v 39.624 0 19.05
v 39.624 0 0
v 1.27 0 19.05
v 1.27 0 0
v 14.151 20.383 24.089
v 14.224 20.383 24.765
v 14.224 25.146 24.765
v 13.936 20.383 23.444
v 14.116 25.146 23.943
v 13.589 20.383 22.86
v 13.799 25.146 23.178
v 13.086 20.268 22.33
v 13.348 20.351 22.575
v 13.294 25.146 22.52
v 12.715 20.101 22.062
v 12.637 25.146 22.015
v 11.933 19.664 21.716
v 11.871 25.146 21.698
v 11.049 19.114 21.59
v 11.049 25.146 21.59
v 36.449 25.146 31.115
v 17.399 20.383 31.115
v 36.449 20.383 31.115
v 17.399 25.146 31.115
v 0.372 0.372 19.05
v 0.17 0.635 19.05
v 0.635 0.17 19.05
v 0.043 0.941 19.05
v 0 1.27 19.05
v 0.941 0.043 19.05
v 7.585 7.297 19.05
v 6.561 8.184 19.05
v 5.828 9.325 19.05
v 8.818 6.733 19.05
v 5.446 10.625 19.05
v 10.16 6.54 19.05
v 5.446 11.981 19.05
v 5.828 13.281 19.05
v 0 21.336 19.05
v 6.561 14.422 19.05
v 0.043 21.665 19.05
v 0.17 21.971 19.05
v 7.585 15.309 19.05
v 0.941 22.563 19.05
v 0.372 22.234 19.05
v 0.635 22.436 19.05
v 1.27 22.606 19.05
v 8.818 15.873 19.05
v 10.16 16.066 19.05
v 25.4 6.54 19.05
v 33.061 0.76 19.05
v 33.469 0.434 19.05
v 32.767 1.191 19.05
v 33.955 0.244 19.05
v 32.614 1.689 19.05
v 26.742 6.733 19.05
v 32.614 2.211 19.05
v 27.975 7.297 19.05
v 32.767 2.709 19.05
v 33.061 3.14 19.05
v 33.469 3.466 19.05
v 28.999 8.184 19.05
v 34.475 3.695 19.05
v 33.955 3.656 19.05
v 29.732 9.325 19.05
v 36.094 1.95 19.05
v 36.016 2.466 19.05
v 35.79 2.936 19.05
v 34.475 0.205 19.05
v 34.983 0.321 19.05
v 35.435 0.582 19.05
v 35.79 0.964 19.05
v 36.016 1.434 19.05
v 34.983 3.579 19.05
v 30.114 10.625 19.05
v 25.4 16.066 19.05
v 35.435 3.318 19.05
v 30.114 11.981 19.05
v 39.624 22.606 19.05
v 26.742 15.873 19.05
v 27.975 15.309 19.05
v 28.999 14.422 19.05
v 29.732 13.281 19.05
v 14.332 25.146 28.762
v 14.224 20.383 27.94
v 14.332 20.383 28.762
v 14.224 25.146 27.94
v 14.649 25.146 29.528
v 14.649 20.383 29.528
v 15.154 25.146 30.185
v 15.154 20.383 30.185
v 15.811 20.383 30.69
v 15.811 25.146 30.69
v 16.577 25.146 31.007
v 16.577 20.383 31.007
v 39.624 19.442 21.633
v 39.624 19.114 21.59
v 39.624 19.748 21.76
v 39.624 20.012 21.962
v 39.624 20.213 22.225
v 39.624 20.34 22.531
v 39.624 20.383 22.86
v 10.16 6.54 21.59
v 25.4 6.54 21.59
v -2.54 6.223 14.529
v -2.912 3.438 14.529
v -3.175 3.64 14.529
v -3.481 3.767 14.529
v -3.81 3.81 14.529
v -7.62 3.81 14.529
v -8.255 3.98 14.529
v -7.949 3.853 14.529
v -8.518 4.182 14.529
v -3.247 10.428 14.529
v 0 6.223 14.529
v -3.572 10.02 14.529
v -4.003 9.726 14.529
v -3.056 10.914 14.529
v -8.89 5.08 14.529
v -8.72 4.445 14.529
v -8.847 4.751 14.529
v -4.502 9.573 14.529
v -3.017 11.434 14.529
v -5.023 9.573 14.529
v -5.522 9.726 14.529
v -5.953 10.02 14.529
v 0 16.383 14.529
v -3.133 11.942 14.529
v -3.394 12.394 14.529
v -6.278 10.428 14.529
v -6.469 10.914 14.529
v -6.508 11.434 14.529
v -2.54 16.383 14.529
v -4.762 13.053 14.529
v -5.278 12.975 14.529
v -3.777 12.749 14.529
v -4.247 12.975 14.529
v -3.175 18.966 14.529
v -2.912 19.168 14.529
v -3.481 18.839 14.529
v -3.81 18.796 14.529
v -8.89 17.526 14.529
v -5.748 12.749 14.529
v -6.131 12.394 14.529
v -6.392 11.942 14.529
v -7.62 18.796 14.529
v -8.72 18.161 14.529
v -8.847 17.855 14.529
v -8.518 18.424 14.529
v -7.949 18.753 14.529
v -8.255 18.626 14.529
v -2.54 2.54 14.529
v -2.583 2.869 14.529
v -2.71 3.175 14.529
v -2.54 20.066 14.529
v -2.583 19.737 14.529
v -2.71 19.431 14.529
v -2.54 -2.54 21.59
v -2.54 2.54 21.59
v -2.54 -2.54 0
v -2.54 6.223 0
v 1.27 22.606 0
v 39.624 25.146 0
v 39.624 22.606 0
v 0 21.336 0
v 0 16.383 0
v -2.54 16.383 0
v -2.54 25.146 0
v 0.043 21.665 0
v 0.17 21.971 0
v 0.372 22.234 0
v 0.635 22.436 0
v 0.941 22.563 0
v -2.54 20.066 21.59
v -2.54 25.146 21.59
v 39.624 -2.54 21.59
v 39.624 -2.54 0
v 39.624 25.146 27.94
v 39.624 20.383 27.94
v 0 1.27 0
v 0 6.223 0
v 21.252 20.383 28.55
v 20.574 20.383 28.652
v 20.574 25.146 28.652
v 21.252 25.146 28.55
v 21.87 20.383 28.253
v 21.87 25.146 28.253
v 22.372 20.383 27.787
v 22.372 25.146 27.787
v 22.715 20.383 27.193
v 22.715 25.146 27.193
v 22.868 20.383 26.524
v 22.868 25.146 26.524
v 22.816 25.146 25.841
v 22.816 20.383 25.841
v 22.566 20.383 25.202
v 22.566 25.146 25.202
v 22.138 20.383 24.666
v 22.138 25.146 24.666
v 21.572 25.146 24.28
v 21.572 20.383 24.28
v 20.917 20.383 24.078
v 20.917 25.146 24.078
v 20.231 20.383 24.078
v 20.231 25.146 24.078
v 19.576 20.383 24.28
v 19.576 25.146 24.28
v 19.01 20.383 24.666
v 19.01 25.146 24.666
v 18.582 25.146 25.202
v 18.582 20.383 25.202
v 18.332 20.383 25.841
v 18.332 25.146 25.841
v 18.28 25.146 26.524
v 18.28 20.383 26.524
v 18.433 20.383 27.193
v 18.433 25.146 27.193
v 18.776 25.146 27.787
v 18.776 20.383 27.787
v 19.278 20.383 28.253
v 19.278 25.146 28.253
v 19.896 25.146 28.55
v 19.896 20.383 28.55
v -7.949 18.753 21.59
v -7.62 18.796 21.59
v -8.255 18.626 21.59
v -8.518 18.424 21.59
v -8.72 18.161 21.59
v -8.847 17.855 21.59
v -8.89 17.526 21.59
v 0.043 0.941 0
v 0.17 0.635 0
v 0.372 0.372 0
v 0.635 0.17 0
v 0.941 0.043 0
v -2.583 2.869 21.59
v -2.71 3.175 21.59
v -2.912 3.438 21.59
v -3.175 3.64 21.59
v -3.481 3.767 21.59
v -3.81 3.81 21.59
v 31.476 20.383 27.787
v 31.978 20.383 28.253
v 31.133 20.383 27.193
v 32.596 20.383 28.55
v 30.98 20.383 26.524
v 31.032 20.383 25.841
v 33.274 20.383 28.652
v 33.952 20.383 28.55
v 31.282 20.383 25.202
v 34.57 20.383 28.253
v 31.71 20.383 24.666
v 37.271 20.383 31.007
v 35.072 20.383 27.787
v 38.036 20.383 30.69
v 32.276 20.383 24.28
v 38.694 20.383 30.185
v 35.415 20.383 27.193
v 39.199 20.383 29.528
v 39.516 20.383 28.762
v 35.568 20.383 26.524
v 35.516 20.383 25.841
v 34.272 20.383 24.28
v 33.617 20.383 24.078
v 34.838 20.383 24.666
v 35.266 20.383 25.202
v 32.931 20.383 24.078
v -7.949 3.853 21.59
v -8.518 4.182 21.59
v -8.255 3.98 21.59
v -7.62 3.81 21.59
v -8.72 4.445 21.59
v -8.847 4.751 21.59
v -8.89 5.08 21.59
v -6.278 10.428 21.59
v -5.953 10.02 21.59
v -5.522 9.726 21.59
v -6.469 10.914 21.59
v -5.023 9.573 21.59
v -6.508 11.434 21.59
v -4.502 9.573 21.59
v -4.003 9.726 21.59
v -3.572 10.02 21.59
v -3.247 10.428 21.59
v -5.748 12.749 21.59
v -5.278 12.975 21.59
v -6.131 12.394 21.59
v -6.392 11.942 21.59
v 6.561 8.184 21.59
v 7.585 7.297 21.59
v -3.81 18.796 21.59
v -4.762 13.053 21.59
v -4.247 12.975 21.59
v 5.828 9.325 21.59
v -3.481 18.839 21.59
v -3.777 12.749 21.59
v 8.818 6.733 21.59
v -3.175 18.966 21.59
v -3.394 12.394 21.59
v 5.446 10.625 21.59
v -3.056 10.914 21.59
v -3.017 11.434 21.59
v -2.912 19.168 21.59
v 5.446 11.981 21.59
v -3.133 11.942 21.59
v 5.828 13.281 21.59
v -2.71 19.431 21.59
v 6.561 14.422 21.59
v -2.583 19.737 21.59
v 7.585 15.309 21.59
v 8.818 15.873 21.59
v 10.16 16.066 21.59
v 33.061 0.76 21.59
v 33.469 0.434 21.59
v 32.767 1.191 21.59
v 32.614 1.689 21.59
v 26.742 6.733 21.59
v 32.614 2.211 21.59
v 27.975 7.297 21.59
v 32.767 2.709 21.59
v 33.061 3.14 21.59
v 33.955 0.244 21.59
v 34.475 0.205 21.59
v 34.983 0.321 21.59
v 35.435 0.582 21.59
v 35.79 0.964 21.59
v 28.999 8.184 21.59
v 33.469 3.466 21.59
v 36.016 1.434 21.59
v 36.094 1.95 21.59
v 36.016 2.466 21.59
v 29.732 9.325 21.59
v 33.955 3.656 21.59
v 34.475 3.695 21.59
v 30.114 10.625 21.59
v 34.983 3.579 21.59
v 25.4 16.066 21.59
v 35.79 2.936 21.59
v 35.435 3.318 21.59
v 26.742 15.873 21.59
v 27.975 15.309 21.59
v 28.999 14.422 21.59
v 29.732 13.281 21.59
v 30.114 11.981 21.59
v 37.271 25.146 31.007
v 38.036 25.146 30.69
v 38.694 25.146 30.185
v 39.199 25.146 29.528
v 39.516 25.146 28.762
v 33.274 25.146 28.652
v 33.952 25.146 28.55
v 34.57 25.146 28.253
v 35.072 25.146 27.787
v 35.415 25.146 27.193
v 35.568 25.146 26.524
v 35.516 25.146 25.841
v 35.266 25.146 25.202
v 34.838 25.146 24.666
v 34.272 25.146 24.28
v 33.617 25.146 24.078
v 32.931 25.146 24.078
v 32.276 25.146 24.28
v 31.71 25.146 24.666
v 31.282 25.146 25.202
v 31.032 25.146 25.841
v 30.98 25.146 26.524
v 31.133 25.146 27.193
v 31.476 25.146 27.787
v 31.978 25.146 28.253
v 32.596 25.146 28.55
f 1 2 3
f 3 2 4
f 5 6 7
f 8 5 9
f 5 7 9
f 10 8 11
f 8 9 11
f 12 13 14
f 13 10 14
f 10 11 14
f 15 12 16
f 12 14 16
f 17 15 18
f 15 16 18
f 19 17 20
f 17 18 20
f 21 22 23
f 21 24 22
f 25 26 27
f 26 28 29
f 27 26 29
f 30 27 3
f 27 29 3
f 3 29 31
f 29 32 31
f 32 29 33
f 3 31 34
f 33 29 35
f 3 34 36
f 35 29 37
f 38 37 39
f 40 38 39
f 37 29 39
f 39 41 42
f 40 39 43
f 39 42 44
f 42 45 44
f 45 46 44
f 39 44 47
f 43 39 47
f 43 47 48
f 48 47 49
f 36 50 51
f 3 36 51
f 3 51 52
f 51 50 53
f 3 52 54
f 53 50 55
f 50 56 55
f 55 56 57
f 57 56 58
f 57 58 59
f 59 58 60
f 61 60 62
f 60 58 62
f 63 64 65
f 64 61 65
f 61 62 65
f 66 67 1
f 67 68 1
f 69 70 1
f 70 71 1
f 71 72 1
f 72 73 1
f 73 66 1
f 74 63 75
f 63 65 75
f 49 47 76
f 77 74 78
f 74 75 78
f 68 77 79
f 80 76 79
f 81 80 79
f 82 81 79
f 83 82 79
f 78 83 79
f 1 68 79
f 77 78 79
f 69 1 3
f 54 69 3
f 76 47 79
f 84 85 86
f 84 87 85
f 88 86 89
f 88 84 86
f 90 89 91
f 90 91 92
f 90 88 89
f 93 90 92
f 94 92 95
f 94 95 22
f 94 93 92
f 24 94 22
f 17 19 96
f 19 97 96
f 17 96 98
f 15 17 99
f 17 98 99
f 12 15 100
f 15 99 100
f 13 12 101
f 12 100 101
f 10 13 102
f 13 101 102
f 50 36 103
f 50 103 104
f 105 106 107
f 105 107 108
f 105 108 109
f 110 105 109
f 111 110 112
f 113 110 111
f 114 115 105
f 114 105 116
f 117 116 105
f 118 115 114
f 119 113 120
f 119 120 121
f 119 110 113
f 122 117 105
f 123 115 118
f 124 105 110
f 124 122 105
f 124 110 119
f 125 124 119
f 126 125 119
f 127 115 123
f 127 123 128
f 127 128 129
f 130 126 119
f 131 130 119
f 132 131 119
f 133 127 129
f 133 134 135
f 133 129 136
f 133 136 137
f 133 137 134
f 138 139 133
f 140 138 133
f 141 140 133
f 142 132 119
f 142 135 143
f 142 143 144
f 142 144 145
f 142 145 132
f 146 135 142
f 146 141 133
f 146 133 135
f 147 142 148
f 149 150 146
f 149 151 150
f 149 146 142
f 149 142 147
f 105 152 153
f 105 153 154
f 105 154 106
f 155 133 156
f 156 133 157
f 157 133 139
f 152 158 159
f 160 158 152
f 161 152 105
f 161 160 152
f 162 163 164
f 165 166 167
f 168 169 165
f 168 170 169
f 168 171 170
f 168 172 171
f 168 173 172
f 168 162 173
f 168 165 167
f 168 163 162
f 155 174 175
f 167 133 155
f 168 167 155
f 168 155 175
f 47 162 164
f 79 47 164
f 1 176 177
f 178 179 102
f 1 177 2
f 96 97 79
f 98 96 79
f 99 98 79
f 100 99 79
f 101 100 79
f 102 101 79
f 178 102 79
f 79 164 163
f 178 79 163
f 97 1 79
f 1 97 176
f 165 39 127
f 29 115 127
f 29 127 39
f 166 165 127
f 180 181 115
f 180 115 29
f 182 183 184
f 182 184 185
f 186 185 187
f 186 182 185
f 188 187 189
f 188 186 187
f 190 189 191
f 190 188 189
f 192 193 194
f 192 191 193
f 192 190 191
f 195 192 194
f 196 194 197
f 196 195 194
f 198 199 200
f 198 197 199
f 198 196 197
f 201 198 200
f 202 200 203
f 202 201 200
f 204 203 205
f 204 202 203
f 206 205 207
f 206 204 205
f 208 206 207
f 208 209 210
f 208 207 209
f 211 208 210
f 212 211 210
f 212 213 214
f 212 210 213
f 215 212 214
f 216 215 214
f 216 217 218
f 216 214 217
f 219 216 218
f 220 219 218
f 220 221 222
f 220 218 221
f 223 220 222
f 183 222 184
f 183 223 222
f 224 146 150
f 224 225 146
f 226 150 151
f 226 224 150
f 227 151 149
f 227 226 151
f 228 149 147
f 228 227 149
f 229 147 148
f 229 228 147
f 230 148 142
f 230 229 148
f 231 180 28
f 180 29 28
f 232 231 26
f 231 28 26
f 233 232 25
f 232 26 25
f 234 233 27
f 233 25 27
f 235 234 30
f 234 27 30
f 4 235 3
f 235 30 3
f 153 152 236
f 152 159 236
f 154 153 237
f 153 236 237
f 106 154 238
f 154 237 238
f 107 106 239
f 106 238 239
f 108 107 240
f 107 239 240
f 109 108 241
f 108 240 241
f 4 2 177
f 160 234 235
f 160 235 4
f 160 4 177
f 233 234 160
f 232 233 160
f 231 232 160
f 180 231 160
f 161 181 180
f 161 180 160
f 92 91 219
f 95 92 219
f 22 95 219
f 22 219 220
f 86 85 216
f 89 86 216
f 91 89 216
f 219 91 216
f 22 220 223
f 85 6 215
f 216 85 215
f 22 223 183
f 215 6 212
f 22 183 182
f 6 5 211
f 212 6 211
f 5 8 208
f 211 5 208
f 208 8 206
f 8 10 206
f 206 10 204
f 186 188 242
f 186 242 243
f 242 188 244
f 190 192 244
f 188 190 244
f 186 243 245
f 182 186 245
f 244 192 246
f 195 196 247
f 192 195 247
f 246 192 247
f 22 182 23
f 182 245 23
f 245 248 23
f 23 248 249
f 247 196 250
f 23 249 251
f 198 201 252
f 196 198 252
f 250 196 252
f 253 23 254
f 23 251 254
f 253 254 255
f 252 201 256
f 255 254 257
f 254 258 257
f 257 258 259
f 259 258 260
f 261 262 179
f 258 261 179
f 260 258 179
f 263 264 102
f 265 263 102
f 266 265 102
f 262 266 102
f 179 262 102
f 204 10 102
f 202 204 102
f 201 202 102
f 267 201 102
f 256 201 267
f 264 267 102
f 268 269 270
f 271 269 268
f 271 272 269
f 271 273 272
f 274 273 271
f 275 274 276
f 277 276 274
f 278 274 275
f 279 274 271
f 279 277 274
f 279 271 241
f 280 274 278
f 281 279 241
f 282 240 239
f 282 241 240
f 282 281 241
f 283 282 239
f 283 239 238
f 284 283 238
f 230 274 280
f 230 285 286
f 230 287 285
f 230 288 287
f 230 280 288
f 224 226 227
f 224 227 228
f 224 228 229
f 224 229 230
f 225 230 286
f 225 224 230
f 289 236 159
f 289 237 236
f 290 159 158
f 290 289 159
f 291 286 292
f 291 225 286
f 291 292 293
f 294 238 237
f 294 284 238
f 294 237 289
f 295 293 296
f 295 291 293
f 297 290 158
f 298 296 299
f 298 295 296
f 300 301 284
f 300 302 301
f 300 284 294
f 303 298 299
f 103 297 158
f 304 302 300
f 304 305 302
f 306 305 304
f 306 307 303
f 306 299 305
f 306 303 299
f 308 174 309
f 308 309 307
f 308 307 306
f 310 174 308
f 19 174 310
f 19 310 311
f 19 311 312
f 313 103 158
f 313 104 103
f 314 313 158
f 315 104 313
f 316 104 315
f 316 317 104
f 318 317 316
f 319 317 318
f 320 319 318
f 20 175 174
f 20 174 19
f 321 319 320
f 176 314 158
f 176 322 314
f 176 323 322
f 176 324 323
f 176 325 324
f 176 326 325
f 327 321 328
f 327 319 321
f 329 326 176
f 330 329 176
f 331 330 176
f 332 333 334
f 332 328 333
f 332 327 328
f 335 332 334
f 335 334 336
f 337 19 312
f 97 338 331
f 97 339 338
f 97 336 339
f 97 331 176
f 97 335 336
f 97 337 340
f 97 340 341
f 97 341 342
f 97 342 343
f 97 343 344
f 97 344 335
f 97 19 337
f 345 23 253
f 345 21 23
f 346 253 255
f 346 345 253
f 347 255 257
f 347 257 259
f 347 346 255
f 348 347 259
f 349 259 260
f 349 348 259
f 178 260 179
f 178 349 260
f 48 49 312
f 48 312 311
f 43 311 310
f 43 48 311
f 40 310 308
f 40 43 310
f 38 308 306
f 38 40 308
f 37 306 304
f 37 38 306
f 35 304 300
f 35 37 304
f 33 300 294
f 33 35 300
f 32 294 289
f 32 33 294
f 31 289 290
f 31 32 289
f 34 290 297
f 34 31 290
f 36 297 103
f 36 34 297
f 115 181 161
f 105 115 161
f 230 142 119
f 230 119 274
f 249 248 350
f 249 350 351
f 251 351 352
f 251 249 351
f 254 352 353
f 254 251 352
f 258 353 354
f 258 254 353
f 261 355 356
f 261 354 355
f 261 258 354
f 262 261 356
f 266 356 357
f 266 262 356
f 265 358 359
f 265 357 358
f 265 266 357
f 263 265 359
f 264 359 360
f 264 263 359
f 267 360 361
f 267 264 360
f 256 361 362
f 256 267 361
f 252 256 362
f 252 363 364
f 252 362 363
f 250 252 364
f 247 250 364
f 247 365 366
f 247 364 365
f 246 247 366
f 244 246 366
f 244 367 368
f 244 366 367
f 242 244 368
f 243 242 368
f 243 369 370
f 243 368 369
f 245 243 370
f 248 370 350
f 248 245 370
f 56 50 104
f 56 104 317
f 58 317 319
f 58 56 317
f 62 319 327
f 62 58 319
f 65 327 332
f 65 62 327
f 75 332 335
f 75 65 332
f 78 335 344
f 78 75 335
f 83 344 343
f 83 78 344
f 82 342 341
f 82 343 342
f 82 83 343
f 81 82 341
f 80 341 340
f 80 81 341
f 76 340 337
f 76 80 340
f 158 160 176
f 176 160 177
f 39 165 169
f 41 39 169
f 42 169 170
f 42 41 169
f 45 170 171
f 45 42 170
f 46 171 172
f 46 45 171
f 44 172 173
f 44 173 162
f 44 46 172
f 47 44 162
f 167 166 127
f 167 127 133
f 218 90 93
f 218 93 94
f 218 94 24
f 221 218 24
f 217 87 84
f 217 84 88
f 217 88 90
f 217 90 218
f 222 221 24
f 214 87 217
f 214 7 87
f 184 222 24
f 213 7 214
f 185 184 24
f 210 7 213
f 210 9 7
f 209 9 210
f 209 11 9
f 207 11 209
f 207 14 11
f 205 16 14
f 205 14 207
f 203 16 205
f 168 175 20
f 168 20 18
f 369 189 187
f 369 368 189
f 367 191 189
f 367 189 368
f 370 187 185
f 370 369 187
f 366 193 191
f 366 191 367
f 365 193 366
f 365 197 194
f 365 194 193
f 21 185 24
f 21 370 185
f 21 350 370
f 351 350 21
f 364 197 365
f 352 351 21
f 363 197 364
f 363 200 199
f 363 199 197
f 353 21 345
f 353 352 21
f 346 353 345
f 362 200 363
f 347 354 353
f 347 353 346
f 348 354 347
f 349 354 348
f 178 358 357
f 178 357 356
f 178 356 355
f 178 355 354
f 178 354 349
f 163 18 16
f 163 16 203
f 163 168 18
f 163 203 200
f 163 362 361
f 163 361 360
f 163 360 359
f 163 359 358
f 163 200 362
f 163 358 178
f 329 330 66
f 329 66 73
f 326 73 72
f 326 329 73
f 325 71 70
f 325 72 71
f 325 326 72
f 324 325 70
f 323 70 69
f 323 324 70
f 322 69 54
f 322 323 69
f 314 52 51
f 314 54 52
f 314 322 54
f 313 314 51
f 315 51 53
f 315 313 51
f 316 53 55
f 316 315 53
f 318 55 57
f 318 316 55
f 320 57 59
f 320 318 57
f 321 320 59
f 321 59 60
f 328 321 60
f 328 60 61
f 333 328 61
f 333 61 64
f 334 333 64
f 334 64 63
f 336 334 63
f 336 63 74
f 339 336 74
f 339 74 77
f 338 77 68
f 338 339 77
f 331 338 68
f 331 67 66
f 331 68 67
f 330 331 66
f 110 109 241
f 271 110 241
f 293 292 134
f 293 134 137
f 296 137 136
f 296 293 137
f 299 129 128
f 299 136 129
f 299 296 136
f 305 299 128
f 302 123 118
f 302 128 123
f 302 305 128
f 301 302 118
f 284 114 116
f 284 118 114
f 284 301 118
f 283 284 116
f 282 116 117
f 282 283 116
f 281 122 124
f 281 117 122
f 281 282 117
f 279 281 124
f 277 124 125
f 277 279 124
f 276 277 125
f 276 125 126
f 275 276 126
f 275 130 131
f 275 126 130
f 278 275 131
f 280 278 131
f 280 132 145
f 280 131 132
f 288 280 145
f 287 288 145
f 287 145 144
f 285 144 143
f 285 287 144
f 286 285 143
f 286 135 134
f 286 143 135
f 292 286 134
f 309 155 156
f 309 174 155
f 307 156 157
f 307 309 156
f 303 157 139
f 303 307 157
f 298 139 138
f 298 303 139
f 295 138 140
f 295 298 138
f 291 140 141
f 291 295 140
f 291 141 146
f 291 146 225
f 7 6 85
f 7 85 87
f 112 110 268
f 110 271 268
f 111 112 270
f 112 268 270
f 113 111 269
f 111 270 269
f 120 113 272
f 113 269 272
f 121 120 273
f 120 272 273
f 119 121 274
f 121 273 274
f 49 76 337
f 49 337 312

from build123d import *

# Parameters (mm, degrees)
BOSS_EXTRUDE1_DEPTH     = 19.05
SKETCH2_W               = 42.164
SKETCH2_H               = 27.686
BOSS_EXTRUDE2_DEPTH     = 2.54
SKETCH3_W               = 7.0612
SKETCH3_H               = 14.986
BOSS_EXTRUDE3_DEPTH     = 6.35
CUT_EXTRUDE1_DEPTH      = 50.127067096
CUT_EXTRUDE1_DEPTH_BACK = 50.127067096
SKETCH4_R               = 1.75
FILLET2_R               = 1.27
CUT_EXTRUDE2_DEPTH      = 52.65763053
CUT_EXTRUDE2_DEPTH_BACK = 52.65763053
SKETCH5_R               = 4.7625
SKETCH6_W               = 25.4
SKETCH6_H               = 4.7625
BOSS_EXTRUDE4_DEPTH     = 9.525
FILLET3_R               = 3.175
FILLET4_R               = 1.27
FILLET6_R               = 1.27
CUT_EXTRUDE3_DEPTH      = 58.486687197
CUT_EXTRUDE3_DEPTH_BACK = 58.486687197
SKETCH8_R               = 2.3
SKETCH9_W               = 2.54
SKETCH9_H               = 10.16
CUT_EXTRUDE4_DEPTH      = 14.5288
CUT_EXTRUDE5_DEPTH      = 51.648644651
CUT_EXTRUDE5_DEPTH_BACK = 51.648644651
SKETCH10_R              = 1.7499965


with BuildPart() as part:
    # Sketch1 → Boss-Extrude1 (new body)
    with BuildSketch(Plane.XY):
        Polygon((-2.54, 25.146), (39.624, 25.146), (39.624, 22.606), (37.084, 22.606), (0, 22.606), (0, 0), (37.084, 0), (39.624, 0), (39.624, -2.54), (-2.54, -2.54), align=None)
    extrude(amount=BOSS_EXTRUDE1_DEPTH)

    # Sketch2 → Boss-Extrude2 (add)
    with BuildSketch(Plane.XY.offset(19.05)):
        with Locations((18.542, 11.303)):
            Rectangle(SKETCH2_W, SKETCH2_H)
    extrude(amount=BOSS_EXTRUDE2_DEPTH)

    # Sketch3 → Boss-Extrude3 (add)
    with BuildSketch(Plane.ZY.offset(2.54)):
        with Locations((18.0594, 11.303)):
            Rectangle(SKETCH3_W, SKETCH3_H)
    extrude(amount=BOSS_EXTRUDE3_DEPTH)

    # Sketch4 → Cut-Extrude1 (cut, two sides: drawn at the far end of the back side and taken through both)
    with BuildSketch(Plane(origin=(0, 0, 14.5288), x_dir=(-1, 0, 0), z_dir=(0, 0, -1)).offset(-CUT_EXTRUDE1_DEPTH_BACK)):
        with Locations(Location((4.7625, 11.303, 0), (0, 0, 90))):
            Circle(SKETCH4_R)
    extrude(amount=CUT_EXTRUDE1_DEPTH + CUT_EXTRUDE1_DEPTH_BACK, mode=Mode.SUBTRACT)

    # Fillet2
    fillet2_edges = [part.edges().sort_by_distance(p)[0] for p in [
        (-2.54, 18.796, 18.0594),
        (-2.54, 3.81, 18.0594),
        (-8.89, 18.796, 18.0594),
        (-8.89, 3.81, 18.0594),
    ]]
    fillet(fillet2_edges, radius=FILLET2_R)

    # Sketch5 → Cut-Extrude2 (cut, two sides: drawn at the far end of the back side and taken through both)
    with BuildSketch(Plane.XY.offset(21.59).offset(-CUT_EXTRUDE2_DEPTH_BACK)):
        with Locations((10.16, 11.303)):
            Circle(SKETCH5_R)
        with BuildLine():
            Line((25.4, 16.0655), (10.16, 16.0655))
            ThreePointArc((10.16, 16.0655), (13.527596045, 14.670596045), (14.9225, 11.303))
            ThreePointArc((14.9225, 11.303), (13.527596045, 7.935403955), (10.16, 6.5405))
            Line((10.16, 6.5405), (25.4, 6.5405))
            ThreePointArc((25.4, 6.5405), (20.6375, 11.303), (25.4, 16.0655))
        make_face()
        with Locations((25.4, 11.303)):
            Circle(SKETCH5_R)
    extrude(amount=CUT_EXTRUDE2_DEPTH + CUT_EXTRUDE2_DEPTH_BACK, mode=Mode.SUBTRACT)

    # Sketch6 → Boss-Extrude4 (add)
    with BuildSketch(Plane.XY.offset(21.59)):
        with Locations((26.924, 22.76475)):
            Rectangle(SKETCH6_W, SKETCH6_H)
    extrude(amount=BOSS_EXTRUDE4_DEPTH)

    # Fillet3
    fillet3_edges = [part.edges().sort_by_distance(p)[0] for p in [
        (14.224, 22.76475, 21.59),
        (14.224, 22.76475, 31.115),
        (39.624, 22.76475, 31.115),
    ]]
    fillet(fillet3_edges, radius=FILLET3_R)

    # Fillet4
    fillet4_edges = [part.edges().sort_by_distance(p)[0] for p in [
        (25.3365, 20.3835, 21.59),
    ]]
    fillet(fillet4_edges, radius=FILLET4_R)

    # Fillet6
    fillet6_edges = [part.edges().sort_by_distance(p)[0] for p in [
        (0, 0, 9.525),
        (0, 22.606, 9.525),
    ]]
    fillet(fillet6_edges, radius=FILLET6_R)

    # Sketch8 → Cut-Extrude3 (cut, two sides: drawn at the far end of the back side and taken through both)
    with BuildSketch(Plane(origin=(0, 25.146, 0), x_dir=(1, 0, 0), z_dir=(0, 1, 0)).offset(-CUT_EXTRUDE3_DEPTH_BACK)):
        with Locations(Location((20.574, -26.3525, 0), (0, 0, 270))):
            Circle(SKETCH8_R)
        with Locations(Location((33.274, -26.3525, 0), (0, 0, 270))):
            Circle(SKETCH8_R)
    extrude(amount=CUT_EXTRUDE3_DEPTH + CUT_EXTRUDE3_DEPTH_BACK, mode=Mode.SUBTRACT)

    # Sketch9 → Cut-Extrude4 (cut)
    with BuildSketch(Plane(origin=(0, 0, 0), x_dir=(-1, 0, 0), z_dir=(0, 0, -1))):
        with Locations((1.27, 11.303)):
            Rectangle(SKETCH9_W, SKETCH9_H)
    extrude(amount=-CUT_EXTRUDE4_DEPTH, mode=Mode.SUBTRACT)

    # Sketch10 → Cut-Extrude5 (cut, two sides: drawn at the far end of the back side and taken through both)
    with BuildSketch(Plane(origin=(0, 0, 19.05), x_dir=(-1, 0, 0), z_dir=(0, 0, -1)).offset(-CUT_EXTRUDE5_DEPTH_BACK)):
        with Locations(Location((-34.344, 1.95, 0), (0, 0, 180))):
            Circle(SKETCH10_R)
    extrude(amount=CUT_EXTRUDE5_DEPTH + CUT_EXTRUDE5_DEPTH_BACK, mode=Mode.SUBTRACT)


solid = part.part
